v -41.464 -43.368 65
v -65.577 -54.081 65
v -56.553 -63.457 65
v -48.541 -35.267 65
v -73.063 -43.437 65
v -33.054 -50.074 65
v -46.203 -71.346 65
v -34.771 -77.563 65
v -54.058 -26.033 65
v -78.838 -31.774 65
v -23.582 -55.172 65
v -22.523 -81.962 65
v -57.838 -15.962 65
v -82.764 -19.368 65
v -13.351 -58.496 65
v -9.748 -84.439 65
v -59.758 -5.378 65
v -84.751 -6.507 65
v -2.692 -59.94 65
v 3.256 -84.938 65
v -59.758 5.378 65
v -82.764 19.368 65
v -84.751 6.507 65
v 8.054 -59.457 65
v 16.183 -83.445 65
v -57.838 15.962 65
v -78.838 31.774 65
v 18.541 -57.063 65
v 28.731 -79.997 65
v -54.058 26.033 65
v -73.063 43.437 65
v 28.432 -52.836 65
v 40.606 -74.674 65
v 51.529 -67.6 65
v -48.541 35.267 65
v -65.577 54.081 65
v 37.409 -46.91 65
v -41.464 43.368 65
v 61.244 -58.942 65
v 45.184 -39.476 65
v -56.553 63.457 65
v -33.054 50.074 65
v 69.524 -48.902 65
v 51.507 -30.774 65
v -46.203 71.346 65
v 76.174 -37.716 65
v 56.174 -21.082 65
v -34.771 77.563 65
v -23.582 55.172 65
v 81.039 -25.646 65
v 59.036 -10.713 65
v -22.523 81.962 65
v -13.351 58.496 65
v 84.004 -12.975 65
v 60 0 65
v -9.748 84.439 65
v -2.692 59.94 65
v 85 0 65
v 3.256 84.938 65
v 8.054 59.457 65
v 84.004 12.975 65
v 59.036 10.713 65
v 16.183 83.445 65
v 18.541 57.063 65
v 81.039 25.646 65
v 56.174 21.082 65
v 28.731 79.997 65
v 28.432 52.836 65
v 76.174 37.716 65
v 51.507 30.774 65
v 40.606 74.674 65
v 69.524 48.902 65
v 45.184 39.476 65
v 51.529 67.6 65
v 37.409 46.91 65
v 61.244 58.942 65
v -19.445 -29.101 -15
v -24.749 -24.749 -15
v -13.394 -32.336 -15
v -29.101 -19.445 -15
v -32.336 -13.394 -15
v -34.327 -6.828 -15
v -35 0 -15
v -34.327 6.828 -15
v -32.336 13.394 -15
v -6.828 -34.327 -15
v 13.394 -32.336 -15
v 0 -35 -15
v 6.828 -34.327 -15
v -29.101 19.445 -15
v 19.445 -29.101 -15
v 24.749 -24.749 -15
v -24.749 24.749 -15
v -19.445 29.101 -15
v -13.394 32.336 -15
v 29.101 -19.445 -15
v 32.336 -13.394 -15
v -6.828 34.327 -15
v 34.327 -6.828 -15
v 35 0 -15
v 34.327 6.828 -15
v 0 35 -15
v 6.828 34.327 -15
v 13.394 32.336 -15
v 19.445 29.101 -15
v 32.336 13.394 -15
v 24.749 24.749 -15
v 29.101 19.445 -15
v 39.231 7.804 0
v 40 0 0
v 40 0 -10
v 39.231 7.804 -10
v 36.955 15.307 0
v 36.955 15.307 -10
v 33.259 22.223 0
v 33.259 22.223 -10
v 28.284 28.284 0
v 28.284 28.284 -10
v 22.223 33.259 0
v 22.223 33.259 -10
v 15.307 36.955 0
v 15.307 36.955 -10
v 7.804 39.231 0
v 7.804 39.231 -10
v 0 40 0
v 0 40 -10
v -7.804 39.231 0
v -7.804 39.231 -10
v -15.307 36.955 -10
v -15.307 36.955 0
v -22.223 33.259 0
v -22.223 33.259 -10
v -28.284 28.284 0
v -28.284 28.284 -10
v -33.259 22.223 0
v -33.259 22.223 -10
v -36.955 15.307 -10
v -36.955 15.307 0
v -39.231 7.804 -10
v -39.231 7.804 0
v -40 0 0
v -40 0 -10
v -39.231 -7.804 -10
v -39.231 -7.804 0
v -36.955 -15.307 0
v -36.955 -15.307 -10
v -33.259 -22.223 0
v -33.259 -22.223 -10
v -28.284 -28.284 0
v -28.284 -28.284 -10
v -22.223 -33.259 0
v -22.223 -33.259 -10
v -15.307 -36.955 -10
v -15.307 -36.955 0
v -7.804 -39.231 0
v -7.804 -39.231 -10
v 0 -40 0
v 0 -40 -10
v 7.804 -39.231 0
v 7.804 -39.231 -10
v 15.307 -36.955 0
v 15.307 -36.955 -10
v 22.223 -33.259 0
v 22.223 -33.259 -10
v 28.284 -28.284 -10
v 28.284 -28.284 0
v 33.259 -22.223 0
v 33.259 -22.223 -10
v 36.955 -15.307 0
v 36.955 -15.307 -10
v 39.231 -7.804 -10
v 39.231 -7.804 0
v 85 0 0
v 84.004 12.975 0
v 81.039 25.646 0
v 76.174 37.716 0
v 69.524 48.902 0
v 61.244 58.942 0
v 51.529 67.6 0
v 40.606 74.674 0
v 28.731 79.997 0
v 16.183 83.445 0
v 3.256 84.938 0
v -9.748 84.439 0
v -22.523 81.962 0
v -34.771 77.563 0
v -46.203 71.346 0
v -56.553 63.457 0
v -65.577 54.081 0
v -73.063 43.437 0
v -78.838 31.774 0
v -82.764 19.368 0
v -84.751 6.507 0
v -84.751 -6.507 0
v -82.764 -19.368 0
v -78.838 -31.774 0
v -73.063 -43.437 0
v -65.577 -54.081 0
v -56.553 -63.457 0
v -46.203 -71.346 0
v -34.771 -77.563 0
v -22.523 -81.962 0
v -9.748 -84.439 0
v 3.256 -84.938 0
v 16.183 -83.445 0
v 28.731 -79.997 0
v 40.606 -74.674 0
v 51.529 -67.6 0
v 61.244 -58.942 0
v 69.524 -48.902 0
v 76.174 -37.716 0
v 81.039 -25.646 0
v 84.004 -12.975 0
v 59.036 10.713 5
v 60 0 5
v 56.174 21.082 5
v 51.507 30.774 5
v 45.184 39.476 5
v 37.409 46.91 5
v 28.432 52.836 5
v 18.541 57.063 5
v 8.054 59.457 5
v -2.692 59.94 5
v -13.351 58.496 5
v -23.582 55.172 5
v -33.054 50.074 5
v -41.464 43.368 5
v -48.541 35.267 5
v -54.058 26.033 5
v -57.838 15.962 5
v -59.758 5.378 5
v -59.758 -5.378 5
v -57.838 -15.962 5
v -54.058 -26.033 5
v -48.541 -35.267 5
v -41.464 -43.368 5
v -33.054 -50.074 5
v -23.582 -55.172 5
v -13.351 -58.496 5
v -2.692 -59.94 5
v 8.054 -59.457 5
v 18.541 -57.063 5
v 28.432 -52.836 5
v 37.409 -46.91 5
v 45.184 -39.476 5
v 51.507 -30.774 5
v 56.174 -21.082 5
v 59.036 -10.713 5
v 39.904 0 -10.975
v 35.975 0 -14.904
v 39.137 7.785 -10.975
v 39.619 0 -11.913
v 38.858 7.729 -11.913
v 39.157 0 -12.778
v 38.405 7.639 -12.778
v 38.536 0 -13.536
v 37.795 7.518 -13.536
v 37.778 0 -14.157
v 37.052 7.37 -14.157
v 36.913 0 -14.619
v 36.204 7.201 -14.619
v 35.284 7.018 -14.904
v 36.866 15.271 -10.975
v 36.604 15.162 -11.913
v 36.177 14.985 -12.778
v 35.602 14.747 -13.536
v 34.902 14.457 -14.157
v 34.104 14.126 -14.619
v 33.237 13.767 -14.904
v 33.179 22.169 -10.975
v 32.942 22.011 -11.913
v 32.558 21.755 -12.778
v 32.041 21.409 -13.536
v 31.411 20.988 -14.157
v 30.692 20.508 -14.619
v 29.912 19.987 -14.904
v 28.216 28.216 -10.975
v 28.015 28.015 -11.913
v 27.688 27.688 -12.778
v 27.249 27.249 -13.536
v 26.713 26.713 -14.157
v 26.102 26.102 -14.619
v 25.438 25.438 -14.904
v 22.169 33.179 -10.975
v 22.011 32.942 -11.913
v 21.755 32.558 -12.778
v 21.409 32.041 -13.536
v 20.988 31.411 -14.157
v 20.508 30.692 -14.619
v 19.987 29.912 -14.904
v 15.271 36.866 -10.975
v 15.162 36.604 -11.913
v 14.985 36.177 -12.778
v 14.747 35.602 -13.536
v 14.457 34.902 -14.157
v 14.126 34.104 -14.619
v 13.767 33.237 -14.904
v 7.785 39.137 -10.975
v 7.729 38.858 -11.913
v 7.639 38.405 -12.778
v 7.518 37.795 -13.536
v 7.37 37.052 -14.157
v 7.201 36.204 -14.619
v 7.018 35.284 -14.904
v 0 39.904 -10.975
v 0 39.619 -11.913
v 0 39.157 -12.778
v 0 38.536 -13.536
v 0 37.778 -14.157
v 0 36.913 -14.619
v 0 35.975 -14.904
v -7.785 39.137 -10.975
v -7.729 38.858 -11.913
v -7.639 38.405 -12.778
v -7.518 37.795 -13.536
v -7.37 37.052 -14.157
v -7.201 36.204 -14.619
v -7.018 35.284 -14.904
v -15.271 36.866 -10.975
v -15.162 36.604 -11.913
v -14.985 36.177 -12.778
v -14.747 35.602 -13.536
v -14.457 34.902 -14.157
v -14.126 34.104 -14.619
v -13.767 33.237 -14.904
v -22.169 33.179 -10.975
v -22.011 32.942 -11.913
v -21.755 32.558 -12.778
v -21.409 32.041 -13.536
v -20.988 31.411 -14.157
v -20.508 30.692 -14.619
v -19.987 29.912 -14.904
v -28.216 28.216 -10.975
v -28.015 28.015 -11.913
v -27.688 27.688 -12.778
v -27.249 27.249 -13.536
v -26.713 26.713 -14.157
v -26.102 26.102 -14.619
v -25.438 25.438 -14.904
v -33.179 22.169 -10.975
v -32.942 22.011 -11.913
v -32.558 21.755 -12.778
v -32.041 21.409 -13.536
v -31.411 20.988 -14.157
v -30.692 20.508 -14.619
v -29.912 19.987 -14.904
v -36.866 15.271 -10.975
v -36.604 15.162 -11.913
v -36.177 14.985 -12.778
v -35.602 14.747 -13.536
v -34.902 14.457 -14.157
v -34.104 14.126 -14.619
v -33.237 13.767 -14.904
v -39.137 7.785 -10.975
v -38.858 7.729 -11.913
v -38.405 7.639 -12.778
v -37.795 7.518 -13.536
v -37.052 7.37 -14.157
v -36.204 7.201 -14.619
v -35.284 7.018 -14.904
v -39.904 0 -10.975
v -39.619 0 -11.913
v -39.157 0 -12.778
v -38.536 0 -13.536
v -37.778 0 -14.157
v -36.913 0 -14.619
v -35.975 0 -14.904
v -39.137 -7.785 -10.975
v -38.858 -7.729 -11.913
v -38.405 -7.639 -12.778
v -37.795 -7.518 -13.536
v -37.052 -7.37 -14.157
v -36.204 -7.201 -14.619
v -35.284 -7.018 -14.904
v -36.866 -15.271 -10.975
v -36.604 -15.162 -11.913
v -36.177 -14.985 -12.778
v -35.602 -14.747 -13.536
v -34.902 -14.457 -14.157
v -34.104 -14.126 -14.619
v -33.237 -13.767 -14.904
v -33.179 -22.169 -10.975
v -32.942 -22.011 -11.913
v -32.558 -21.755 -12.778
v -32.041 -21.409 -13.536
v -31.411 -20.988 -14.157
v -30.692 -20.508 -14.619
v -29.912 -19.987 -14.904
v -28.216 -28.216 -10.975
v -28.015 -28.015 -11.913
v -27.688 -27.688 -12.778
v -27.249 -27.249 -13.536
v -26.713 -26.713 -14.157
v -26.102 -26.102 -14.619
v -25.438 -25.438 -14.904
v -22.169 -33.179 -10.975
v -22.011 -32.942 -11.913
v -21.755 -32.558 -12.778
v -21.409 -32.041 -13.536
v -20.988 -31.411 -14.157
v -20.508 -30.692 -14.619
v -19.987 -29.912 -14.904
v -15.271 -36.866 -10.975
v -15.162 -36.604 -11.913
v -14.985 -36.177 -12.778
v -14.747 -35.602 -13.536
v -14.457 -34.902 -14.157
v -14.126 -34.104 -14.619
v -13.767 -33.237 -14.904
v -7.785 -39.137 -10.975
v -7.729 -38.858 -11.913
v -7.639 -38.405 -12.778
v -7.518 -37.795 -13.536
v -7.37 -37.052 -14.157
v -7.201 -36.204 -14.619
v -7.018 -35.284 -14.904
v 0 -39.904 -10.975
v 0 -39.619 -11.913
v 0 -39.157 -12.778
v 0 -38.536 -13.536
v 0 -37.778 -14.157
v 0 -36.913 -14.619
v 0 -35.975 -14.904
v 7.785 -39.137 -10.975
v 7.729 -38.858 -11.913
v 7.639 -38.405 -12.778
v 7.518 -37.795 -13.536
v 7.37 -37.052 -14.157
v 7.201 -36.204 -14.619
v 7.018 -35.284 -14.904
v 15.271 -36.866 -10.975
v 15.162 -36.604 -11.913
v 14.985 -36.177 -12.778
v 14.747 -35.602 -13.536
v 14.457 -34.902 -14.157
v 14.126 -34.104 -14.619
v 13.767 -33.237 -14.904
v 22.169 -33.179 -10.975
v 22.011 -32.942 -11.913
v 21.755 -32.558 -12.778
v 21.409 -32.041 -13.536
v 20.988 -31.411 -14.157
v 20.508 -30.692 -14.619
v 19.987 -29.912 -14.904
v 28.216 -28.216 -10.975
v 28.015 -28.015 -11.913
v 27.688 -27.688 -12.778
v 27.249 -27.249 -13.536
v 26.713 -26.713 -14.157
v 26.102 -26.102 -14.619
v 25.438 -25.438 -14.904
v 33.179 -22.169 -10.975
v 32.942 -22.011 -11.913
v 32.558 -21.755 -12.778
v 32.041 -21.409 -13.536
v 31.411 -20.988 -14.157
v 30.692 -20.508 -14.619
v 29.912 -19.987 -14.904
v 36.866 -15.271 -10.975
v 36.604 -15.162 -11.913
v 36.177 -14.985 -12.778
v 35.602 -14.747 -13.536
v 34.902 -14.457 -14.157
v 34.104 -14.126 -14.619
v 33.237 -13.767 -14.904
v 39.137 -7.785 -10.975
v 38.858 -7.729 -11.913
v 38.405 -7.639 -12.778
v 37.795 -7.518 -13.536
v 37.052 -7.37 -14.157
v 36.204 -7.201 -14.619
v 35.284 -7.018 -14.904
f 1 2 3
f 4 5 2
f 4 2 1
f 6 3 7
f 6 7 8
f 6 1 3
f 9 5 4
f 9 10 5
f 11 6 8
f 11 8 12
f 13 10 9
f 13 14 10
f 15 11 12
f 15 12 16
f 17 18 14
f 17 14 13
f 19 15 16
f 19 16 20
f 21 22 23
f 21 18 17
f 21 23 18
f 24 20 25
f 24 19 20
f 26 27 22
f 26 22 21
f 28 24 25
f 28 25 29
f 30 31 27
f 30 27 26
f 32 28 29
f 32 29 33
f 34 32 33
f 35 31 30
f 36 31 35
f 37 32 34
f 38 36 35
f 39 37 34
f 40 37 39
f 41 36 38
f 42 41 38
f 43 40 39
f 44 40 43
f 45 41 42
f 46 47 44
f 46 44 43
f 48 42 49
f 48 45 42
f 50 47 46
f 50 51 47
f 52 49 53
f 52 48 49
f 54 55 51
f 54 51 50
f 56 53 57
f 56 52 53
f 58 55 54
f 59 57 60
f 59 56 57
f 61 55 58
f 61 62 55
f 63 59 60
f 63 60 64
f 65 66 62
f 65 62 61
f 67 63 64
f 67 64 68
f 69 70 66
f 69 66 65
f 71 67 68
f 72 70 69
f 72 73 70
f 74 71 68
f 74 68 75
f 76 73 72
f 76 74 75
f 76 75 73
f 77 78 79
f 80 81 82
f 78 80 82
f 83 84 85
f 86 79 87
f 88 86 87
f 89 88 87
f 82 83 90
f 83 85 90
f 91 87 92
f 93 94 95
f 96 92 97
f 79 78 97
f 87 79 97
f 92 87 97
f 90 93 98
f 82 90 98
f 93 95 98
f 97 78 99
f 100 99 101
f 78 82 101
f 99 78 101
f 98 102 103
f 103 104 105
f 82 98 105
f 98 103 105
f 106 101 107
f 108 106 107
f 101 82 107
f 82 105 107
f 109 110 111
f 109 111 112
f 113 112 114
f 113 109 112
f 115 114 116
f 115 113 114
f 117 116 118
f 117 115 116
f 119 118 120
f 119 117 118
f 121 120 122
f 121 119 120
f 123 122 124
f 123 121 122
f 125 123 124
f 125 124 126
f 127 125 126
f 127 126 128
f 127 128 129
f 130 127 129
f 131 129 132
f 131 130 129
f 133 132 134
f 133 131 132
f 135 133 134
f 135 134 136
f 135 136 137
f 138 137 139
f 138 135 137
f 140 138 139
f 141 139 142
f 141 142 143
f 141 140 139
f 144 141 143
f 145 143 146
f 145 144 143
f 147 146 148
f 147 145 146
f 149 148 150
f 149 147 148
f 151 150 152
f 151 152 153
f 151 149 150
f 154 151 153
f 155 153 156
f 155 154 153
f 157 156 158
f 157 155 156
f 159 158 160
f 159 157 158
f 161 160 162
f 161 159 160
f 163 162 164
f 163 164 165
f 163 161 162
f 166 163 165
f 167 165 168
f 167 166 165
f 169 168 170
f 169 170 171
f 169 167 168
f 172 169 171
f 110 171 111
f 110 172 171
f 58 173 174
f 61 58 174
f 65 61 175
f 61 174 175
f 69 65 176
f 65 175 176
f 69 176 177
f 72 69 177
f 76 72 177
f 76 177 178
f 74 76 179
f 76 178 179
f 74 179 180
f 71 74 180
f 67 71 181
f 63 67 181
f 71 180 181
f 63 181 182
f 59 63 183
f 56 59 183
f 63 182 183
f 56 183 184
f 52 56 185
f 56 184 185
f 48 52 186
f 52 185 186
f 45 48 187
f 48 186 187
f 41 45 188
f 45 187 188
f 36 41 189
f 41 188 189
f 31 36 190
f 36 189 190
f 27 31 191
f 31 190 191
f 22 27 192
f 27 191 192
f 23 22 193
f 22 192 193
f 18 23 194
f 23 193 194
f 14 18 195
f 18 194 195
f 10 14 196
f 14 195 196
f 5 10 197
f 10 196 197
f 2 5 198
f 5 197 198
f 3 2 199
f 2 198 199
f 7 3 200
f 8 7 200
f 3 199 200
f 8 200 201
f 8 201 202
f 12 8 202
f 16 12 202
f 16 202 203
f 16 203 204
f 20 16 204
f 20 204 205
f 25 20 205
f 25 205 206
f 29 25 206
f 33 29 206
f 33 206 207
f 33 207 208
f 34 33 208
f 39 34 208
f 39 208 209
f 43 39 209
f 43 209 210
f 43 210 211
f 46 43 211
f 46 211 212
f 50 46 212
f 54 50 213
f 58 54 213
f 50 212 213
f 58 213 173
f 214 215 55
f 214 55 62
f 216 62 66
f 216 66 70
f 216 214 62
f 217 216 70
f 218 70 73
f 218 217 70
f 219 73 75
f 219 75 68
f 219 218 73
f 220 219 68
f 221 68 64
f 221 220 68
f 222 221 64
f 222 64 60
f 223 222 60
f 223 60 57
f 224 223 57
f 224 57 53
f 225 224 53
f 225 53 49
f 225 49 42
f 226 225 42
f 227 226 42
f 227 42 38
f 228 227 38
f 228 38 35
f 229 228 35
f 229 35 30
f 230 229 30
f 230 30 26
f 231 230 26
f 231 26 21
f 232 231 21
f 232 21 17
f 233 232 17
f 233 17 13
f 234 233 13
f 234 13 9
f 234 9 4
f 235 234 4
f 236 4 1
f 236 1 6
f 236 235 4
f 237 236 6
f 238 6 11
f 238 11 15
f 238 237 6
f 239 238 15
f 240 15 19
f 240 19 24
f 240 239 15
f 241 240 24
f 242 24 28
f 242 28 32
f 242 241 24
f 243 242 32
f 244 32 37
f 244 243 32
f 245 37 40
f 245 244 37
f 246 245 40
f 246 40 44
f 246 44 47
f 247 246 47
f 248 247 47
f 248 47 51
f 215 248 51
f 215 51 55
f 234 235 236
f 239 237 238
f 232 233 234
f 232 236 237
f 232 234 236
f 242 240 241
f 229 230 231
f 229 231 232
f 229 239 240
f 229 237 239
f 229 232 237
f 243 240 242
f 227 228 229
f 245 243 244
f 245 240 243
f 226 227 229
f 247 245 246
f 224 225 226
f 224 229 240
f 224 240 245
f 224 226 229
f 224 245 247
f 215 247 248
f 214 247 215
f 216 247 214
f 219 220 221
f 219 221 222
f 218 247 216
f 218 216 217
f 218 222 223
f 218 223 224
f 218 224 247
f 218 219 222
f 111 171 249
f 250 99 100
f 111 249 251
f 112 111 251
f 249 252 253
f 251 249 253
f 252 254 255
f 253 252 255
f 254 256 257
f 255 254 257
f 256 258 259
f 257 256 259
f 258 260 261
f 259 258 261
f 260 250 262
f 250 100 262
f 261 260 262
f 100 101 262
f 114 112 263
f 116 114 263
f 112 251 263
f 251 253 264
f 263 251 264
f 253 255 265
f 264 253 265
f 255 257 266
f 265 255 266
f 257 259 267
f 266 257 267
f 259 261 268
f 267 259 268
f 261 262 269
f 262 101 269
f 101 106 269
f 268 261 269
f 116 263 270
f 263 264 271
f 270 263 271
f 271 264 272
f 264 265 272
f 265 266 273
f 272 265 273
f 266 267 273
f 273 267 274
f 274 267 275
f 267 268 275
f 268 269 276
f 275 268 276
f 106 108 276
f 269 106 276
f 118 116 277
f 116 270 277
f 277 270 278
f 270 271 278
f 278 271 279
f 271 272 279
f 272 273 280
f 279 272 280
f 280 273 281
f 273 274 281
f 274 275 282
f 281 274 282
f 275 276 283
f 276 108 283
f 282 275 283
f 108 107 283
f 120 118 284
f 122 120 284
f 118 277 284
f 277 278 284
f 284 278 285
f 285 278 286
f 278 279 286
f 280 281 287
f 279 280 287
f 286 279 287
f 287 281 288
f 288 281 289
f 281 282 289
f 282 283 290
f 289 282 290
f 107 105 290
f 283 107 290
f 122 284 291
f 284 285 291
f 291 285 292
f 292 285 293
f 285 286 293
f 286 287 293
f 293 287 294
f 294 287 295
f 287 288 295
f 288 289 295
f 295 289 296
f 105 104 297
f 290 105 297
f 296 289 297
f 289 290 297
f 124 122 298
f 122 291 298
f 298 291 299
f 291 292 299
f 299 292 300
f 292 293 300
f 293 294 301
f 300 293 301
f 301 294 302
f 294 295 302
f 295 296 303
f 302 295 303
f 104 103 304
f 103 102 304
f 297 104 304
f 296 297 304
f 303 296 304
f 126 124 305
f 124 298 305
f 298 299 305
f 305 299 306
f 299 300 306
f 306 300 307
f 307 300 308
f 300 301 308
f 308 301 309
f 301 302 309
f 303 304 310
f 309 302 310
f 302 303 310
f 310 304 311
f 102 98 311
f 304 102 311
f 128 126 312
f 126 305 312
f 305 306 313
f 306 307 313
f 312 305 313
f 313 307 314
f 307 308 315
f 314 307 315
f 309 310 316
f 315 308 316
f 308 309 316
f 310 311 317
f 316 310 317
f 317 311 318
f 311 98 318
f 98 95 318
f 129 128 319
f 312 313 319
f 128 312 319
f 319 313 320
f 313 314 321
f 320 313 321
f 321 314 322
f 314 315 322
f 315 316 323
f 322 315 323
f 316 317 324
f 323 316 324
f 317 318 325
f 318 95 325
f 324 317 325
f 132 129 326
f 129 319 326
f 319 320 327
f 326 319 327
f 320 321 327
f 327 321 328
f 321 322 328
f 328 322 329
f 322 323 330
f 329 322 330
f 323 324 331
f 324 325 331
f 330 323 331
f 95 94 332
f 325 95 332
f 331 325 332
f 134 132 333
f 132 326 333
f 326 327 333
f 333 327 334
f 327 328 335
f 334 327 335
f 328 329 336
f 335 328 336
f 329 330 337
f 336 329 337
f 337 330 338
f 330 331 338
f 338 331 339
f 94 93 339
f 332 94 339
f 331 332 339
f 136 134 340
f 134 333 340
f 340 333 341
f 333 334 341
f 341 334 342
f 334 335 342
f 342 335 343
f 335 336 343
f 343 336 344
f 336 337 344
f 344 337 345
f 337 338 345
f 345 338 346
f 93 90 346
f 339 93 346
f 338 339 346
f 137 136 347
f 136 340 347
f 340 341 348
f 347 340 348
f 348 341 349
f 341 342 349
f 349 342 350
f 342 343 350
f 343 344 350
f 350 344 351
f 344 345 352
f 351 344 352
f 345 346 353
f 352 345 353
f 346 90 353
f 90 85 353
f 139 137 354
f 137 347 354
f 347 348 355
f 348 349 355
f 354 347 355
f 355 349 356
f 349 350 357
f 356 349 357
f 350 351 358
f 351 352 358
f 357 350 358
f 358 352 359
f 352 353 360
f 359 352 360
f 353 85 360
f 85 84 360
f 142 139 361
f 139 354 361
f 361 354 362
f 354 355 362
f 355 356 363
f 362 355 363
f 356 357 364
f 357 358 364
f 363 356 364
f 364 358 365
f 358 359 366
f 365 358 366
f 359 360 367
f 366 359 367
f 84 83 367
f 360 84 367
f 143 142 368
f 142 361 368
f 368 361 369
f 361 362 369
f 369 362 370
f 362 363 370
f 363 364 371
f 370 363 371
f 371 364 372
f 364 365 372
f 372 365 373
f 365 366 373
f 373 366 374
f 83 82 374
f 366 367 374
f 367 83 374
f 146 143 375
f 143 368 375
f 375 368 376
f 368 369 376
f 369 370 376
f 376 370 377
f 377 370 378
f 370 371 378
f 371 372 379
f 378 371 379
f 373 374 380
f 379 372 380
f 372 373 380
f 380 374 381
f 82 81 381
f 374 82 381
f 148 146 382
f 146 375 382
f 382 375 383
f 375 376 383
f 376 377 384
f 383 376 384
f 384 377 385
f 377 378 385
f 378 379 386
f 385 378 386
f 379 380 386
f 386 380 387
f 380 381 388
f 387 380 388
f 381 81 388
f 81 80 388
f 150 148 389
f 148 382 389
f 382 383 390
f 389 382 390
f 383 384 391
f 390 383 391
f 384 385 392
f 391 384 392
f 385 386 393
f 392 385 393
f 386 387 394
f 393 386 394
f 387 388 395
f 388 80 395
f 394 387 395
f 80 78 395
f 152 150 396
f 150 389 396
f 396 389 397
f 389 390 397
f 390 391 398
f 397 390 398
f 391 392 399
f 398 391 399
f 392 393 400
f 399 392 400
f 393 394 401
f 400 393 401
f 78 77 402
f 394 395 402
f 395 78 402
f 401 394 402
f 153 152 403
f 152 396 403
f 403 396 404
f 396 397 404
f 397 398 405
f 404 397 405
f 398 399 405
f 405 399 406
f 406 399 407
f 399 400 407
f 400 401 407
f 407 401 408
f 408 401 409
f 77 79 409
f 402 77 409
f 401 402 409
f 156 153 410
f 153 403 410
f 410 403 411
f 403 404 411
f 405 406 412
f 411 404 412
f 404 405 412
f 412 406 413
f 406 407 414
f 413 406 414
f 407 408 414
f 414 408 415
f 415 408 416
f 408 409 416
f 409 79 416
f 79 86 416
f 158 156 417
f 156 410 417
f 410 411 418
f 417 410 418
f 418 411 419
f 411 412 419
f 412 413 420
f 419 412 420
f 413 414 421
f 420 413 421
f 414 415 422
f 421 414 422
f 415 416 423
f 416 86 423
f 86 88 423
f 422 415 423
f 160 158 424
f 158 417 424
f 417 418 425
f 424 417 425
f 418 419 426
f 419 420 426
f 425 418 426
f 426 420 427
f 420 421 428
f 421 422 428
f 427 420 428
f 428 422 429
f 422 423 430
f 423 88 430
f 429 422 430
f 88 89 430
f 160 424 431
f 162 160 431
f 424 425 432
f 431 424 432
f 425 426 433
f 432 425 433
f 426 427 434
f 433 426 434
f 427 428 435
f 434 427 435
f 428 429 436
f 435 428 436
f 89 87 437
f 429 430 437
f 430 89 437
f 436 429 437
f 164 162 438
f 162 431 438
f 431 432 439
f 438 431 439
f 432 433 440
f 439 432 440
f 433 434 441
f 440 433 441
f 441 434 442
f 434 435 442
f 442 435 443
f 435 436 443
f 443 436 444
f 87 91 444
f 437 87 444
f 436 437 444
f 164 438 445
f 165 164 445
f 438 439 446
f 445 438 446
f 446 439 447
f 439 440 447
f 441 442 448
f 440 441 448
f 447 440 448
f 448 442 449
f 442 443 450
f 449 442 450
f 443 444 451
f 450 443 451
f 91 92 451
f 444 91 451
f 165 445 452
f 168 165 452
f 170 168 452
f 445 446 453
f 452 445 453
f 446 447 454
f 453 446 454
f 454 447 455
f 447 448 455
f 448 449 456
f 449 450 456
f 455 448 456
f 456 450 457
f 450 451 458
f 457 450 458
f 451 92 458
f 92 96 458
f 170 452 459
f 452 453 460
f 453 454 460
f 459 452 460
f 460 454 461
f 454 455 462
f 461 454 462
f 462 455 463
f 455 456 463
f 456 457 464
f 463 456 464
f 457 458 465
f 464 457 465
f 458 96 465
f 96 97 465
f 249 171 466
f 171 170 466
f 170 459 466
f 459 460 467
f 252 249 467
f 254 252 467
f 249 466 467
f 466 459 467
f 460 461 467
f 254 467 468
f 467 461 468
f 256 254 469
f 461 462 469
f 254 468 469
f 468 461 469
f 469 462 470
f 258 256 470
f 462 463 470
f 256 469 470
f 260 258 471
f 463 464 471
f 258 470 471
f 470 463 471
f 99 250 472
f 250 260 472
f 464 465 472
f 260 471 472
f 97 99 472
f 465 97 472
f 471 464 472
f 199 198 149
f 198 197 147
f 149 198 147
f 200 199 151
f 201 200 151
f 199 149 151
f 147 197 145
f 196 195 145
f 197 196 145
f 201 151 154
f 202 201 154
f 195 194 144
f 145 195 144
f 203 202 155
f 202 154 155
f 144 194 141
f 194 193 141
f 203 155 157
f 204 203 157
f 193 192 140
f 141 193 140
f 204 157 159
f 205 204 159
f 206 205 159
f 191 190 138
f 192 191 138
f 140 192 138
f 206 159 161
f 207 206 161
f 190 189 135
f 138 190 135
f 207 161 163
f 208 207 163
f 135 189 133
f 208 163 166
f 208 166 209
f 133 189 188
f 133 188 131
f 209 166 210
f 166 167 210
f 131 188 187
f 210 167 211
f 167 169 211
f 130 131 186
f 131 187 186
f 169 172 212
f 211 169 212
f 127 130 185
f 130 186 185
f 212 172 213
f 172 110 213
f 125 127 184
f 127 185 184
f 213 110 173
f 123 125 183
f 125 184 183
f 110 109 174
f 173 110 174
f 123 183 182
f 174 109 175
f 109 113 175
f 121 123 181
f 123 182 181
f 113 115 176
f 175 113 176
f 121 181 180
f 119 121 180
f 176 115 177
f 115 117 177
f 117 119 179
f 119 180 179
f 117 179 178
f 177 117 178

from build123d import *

# Parameters (mm, degrees)
F0_R          = 85
F0_R_2        = 60
F1_DEPTH      = 65
F0_R_3        = 40
F2_DEPTH      = 5
F3_DEPTH      = 5
F3_DEPTH_BACK = 15
F4_R          = 5


with BuildPart() as f1:
    # F0 (on Top) → F1 (new body)
    with BuildSketch(Plane.XY):
        Circle(F0_R)
        Circle(F0_R_2, mode=Mode.SUBTRACT)
    extrude(amount=F1_DEPTH)

    # F0 (on Top) → F2 (join)
    with BuildSketch(Plane.XY):
        Circle(F0_R_2)
        Circle(F0_R_3, mode=Mode.SUBTRACT)
    extrude(amount=F2_DEPTH)

    # F0 (on Top) → F3 (join, two sides)
    with BuildSketch(Plane.XY) as f3_sk:
        Circle(F0_R_3)
    extrude(amount=F3_DEPTH)
    extrude(f3_sk.sketch, amount=-F3_DEPTH_BACK)

    # F4
    f4_edges = [f1.edges().sort_by_distance(p)[0] for p in [
        (-40, 0, -15),
    ]]
    fillet(f4_edges, radius=F4_R)


solid = f1.part
